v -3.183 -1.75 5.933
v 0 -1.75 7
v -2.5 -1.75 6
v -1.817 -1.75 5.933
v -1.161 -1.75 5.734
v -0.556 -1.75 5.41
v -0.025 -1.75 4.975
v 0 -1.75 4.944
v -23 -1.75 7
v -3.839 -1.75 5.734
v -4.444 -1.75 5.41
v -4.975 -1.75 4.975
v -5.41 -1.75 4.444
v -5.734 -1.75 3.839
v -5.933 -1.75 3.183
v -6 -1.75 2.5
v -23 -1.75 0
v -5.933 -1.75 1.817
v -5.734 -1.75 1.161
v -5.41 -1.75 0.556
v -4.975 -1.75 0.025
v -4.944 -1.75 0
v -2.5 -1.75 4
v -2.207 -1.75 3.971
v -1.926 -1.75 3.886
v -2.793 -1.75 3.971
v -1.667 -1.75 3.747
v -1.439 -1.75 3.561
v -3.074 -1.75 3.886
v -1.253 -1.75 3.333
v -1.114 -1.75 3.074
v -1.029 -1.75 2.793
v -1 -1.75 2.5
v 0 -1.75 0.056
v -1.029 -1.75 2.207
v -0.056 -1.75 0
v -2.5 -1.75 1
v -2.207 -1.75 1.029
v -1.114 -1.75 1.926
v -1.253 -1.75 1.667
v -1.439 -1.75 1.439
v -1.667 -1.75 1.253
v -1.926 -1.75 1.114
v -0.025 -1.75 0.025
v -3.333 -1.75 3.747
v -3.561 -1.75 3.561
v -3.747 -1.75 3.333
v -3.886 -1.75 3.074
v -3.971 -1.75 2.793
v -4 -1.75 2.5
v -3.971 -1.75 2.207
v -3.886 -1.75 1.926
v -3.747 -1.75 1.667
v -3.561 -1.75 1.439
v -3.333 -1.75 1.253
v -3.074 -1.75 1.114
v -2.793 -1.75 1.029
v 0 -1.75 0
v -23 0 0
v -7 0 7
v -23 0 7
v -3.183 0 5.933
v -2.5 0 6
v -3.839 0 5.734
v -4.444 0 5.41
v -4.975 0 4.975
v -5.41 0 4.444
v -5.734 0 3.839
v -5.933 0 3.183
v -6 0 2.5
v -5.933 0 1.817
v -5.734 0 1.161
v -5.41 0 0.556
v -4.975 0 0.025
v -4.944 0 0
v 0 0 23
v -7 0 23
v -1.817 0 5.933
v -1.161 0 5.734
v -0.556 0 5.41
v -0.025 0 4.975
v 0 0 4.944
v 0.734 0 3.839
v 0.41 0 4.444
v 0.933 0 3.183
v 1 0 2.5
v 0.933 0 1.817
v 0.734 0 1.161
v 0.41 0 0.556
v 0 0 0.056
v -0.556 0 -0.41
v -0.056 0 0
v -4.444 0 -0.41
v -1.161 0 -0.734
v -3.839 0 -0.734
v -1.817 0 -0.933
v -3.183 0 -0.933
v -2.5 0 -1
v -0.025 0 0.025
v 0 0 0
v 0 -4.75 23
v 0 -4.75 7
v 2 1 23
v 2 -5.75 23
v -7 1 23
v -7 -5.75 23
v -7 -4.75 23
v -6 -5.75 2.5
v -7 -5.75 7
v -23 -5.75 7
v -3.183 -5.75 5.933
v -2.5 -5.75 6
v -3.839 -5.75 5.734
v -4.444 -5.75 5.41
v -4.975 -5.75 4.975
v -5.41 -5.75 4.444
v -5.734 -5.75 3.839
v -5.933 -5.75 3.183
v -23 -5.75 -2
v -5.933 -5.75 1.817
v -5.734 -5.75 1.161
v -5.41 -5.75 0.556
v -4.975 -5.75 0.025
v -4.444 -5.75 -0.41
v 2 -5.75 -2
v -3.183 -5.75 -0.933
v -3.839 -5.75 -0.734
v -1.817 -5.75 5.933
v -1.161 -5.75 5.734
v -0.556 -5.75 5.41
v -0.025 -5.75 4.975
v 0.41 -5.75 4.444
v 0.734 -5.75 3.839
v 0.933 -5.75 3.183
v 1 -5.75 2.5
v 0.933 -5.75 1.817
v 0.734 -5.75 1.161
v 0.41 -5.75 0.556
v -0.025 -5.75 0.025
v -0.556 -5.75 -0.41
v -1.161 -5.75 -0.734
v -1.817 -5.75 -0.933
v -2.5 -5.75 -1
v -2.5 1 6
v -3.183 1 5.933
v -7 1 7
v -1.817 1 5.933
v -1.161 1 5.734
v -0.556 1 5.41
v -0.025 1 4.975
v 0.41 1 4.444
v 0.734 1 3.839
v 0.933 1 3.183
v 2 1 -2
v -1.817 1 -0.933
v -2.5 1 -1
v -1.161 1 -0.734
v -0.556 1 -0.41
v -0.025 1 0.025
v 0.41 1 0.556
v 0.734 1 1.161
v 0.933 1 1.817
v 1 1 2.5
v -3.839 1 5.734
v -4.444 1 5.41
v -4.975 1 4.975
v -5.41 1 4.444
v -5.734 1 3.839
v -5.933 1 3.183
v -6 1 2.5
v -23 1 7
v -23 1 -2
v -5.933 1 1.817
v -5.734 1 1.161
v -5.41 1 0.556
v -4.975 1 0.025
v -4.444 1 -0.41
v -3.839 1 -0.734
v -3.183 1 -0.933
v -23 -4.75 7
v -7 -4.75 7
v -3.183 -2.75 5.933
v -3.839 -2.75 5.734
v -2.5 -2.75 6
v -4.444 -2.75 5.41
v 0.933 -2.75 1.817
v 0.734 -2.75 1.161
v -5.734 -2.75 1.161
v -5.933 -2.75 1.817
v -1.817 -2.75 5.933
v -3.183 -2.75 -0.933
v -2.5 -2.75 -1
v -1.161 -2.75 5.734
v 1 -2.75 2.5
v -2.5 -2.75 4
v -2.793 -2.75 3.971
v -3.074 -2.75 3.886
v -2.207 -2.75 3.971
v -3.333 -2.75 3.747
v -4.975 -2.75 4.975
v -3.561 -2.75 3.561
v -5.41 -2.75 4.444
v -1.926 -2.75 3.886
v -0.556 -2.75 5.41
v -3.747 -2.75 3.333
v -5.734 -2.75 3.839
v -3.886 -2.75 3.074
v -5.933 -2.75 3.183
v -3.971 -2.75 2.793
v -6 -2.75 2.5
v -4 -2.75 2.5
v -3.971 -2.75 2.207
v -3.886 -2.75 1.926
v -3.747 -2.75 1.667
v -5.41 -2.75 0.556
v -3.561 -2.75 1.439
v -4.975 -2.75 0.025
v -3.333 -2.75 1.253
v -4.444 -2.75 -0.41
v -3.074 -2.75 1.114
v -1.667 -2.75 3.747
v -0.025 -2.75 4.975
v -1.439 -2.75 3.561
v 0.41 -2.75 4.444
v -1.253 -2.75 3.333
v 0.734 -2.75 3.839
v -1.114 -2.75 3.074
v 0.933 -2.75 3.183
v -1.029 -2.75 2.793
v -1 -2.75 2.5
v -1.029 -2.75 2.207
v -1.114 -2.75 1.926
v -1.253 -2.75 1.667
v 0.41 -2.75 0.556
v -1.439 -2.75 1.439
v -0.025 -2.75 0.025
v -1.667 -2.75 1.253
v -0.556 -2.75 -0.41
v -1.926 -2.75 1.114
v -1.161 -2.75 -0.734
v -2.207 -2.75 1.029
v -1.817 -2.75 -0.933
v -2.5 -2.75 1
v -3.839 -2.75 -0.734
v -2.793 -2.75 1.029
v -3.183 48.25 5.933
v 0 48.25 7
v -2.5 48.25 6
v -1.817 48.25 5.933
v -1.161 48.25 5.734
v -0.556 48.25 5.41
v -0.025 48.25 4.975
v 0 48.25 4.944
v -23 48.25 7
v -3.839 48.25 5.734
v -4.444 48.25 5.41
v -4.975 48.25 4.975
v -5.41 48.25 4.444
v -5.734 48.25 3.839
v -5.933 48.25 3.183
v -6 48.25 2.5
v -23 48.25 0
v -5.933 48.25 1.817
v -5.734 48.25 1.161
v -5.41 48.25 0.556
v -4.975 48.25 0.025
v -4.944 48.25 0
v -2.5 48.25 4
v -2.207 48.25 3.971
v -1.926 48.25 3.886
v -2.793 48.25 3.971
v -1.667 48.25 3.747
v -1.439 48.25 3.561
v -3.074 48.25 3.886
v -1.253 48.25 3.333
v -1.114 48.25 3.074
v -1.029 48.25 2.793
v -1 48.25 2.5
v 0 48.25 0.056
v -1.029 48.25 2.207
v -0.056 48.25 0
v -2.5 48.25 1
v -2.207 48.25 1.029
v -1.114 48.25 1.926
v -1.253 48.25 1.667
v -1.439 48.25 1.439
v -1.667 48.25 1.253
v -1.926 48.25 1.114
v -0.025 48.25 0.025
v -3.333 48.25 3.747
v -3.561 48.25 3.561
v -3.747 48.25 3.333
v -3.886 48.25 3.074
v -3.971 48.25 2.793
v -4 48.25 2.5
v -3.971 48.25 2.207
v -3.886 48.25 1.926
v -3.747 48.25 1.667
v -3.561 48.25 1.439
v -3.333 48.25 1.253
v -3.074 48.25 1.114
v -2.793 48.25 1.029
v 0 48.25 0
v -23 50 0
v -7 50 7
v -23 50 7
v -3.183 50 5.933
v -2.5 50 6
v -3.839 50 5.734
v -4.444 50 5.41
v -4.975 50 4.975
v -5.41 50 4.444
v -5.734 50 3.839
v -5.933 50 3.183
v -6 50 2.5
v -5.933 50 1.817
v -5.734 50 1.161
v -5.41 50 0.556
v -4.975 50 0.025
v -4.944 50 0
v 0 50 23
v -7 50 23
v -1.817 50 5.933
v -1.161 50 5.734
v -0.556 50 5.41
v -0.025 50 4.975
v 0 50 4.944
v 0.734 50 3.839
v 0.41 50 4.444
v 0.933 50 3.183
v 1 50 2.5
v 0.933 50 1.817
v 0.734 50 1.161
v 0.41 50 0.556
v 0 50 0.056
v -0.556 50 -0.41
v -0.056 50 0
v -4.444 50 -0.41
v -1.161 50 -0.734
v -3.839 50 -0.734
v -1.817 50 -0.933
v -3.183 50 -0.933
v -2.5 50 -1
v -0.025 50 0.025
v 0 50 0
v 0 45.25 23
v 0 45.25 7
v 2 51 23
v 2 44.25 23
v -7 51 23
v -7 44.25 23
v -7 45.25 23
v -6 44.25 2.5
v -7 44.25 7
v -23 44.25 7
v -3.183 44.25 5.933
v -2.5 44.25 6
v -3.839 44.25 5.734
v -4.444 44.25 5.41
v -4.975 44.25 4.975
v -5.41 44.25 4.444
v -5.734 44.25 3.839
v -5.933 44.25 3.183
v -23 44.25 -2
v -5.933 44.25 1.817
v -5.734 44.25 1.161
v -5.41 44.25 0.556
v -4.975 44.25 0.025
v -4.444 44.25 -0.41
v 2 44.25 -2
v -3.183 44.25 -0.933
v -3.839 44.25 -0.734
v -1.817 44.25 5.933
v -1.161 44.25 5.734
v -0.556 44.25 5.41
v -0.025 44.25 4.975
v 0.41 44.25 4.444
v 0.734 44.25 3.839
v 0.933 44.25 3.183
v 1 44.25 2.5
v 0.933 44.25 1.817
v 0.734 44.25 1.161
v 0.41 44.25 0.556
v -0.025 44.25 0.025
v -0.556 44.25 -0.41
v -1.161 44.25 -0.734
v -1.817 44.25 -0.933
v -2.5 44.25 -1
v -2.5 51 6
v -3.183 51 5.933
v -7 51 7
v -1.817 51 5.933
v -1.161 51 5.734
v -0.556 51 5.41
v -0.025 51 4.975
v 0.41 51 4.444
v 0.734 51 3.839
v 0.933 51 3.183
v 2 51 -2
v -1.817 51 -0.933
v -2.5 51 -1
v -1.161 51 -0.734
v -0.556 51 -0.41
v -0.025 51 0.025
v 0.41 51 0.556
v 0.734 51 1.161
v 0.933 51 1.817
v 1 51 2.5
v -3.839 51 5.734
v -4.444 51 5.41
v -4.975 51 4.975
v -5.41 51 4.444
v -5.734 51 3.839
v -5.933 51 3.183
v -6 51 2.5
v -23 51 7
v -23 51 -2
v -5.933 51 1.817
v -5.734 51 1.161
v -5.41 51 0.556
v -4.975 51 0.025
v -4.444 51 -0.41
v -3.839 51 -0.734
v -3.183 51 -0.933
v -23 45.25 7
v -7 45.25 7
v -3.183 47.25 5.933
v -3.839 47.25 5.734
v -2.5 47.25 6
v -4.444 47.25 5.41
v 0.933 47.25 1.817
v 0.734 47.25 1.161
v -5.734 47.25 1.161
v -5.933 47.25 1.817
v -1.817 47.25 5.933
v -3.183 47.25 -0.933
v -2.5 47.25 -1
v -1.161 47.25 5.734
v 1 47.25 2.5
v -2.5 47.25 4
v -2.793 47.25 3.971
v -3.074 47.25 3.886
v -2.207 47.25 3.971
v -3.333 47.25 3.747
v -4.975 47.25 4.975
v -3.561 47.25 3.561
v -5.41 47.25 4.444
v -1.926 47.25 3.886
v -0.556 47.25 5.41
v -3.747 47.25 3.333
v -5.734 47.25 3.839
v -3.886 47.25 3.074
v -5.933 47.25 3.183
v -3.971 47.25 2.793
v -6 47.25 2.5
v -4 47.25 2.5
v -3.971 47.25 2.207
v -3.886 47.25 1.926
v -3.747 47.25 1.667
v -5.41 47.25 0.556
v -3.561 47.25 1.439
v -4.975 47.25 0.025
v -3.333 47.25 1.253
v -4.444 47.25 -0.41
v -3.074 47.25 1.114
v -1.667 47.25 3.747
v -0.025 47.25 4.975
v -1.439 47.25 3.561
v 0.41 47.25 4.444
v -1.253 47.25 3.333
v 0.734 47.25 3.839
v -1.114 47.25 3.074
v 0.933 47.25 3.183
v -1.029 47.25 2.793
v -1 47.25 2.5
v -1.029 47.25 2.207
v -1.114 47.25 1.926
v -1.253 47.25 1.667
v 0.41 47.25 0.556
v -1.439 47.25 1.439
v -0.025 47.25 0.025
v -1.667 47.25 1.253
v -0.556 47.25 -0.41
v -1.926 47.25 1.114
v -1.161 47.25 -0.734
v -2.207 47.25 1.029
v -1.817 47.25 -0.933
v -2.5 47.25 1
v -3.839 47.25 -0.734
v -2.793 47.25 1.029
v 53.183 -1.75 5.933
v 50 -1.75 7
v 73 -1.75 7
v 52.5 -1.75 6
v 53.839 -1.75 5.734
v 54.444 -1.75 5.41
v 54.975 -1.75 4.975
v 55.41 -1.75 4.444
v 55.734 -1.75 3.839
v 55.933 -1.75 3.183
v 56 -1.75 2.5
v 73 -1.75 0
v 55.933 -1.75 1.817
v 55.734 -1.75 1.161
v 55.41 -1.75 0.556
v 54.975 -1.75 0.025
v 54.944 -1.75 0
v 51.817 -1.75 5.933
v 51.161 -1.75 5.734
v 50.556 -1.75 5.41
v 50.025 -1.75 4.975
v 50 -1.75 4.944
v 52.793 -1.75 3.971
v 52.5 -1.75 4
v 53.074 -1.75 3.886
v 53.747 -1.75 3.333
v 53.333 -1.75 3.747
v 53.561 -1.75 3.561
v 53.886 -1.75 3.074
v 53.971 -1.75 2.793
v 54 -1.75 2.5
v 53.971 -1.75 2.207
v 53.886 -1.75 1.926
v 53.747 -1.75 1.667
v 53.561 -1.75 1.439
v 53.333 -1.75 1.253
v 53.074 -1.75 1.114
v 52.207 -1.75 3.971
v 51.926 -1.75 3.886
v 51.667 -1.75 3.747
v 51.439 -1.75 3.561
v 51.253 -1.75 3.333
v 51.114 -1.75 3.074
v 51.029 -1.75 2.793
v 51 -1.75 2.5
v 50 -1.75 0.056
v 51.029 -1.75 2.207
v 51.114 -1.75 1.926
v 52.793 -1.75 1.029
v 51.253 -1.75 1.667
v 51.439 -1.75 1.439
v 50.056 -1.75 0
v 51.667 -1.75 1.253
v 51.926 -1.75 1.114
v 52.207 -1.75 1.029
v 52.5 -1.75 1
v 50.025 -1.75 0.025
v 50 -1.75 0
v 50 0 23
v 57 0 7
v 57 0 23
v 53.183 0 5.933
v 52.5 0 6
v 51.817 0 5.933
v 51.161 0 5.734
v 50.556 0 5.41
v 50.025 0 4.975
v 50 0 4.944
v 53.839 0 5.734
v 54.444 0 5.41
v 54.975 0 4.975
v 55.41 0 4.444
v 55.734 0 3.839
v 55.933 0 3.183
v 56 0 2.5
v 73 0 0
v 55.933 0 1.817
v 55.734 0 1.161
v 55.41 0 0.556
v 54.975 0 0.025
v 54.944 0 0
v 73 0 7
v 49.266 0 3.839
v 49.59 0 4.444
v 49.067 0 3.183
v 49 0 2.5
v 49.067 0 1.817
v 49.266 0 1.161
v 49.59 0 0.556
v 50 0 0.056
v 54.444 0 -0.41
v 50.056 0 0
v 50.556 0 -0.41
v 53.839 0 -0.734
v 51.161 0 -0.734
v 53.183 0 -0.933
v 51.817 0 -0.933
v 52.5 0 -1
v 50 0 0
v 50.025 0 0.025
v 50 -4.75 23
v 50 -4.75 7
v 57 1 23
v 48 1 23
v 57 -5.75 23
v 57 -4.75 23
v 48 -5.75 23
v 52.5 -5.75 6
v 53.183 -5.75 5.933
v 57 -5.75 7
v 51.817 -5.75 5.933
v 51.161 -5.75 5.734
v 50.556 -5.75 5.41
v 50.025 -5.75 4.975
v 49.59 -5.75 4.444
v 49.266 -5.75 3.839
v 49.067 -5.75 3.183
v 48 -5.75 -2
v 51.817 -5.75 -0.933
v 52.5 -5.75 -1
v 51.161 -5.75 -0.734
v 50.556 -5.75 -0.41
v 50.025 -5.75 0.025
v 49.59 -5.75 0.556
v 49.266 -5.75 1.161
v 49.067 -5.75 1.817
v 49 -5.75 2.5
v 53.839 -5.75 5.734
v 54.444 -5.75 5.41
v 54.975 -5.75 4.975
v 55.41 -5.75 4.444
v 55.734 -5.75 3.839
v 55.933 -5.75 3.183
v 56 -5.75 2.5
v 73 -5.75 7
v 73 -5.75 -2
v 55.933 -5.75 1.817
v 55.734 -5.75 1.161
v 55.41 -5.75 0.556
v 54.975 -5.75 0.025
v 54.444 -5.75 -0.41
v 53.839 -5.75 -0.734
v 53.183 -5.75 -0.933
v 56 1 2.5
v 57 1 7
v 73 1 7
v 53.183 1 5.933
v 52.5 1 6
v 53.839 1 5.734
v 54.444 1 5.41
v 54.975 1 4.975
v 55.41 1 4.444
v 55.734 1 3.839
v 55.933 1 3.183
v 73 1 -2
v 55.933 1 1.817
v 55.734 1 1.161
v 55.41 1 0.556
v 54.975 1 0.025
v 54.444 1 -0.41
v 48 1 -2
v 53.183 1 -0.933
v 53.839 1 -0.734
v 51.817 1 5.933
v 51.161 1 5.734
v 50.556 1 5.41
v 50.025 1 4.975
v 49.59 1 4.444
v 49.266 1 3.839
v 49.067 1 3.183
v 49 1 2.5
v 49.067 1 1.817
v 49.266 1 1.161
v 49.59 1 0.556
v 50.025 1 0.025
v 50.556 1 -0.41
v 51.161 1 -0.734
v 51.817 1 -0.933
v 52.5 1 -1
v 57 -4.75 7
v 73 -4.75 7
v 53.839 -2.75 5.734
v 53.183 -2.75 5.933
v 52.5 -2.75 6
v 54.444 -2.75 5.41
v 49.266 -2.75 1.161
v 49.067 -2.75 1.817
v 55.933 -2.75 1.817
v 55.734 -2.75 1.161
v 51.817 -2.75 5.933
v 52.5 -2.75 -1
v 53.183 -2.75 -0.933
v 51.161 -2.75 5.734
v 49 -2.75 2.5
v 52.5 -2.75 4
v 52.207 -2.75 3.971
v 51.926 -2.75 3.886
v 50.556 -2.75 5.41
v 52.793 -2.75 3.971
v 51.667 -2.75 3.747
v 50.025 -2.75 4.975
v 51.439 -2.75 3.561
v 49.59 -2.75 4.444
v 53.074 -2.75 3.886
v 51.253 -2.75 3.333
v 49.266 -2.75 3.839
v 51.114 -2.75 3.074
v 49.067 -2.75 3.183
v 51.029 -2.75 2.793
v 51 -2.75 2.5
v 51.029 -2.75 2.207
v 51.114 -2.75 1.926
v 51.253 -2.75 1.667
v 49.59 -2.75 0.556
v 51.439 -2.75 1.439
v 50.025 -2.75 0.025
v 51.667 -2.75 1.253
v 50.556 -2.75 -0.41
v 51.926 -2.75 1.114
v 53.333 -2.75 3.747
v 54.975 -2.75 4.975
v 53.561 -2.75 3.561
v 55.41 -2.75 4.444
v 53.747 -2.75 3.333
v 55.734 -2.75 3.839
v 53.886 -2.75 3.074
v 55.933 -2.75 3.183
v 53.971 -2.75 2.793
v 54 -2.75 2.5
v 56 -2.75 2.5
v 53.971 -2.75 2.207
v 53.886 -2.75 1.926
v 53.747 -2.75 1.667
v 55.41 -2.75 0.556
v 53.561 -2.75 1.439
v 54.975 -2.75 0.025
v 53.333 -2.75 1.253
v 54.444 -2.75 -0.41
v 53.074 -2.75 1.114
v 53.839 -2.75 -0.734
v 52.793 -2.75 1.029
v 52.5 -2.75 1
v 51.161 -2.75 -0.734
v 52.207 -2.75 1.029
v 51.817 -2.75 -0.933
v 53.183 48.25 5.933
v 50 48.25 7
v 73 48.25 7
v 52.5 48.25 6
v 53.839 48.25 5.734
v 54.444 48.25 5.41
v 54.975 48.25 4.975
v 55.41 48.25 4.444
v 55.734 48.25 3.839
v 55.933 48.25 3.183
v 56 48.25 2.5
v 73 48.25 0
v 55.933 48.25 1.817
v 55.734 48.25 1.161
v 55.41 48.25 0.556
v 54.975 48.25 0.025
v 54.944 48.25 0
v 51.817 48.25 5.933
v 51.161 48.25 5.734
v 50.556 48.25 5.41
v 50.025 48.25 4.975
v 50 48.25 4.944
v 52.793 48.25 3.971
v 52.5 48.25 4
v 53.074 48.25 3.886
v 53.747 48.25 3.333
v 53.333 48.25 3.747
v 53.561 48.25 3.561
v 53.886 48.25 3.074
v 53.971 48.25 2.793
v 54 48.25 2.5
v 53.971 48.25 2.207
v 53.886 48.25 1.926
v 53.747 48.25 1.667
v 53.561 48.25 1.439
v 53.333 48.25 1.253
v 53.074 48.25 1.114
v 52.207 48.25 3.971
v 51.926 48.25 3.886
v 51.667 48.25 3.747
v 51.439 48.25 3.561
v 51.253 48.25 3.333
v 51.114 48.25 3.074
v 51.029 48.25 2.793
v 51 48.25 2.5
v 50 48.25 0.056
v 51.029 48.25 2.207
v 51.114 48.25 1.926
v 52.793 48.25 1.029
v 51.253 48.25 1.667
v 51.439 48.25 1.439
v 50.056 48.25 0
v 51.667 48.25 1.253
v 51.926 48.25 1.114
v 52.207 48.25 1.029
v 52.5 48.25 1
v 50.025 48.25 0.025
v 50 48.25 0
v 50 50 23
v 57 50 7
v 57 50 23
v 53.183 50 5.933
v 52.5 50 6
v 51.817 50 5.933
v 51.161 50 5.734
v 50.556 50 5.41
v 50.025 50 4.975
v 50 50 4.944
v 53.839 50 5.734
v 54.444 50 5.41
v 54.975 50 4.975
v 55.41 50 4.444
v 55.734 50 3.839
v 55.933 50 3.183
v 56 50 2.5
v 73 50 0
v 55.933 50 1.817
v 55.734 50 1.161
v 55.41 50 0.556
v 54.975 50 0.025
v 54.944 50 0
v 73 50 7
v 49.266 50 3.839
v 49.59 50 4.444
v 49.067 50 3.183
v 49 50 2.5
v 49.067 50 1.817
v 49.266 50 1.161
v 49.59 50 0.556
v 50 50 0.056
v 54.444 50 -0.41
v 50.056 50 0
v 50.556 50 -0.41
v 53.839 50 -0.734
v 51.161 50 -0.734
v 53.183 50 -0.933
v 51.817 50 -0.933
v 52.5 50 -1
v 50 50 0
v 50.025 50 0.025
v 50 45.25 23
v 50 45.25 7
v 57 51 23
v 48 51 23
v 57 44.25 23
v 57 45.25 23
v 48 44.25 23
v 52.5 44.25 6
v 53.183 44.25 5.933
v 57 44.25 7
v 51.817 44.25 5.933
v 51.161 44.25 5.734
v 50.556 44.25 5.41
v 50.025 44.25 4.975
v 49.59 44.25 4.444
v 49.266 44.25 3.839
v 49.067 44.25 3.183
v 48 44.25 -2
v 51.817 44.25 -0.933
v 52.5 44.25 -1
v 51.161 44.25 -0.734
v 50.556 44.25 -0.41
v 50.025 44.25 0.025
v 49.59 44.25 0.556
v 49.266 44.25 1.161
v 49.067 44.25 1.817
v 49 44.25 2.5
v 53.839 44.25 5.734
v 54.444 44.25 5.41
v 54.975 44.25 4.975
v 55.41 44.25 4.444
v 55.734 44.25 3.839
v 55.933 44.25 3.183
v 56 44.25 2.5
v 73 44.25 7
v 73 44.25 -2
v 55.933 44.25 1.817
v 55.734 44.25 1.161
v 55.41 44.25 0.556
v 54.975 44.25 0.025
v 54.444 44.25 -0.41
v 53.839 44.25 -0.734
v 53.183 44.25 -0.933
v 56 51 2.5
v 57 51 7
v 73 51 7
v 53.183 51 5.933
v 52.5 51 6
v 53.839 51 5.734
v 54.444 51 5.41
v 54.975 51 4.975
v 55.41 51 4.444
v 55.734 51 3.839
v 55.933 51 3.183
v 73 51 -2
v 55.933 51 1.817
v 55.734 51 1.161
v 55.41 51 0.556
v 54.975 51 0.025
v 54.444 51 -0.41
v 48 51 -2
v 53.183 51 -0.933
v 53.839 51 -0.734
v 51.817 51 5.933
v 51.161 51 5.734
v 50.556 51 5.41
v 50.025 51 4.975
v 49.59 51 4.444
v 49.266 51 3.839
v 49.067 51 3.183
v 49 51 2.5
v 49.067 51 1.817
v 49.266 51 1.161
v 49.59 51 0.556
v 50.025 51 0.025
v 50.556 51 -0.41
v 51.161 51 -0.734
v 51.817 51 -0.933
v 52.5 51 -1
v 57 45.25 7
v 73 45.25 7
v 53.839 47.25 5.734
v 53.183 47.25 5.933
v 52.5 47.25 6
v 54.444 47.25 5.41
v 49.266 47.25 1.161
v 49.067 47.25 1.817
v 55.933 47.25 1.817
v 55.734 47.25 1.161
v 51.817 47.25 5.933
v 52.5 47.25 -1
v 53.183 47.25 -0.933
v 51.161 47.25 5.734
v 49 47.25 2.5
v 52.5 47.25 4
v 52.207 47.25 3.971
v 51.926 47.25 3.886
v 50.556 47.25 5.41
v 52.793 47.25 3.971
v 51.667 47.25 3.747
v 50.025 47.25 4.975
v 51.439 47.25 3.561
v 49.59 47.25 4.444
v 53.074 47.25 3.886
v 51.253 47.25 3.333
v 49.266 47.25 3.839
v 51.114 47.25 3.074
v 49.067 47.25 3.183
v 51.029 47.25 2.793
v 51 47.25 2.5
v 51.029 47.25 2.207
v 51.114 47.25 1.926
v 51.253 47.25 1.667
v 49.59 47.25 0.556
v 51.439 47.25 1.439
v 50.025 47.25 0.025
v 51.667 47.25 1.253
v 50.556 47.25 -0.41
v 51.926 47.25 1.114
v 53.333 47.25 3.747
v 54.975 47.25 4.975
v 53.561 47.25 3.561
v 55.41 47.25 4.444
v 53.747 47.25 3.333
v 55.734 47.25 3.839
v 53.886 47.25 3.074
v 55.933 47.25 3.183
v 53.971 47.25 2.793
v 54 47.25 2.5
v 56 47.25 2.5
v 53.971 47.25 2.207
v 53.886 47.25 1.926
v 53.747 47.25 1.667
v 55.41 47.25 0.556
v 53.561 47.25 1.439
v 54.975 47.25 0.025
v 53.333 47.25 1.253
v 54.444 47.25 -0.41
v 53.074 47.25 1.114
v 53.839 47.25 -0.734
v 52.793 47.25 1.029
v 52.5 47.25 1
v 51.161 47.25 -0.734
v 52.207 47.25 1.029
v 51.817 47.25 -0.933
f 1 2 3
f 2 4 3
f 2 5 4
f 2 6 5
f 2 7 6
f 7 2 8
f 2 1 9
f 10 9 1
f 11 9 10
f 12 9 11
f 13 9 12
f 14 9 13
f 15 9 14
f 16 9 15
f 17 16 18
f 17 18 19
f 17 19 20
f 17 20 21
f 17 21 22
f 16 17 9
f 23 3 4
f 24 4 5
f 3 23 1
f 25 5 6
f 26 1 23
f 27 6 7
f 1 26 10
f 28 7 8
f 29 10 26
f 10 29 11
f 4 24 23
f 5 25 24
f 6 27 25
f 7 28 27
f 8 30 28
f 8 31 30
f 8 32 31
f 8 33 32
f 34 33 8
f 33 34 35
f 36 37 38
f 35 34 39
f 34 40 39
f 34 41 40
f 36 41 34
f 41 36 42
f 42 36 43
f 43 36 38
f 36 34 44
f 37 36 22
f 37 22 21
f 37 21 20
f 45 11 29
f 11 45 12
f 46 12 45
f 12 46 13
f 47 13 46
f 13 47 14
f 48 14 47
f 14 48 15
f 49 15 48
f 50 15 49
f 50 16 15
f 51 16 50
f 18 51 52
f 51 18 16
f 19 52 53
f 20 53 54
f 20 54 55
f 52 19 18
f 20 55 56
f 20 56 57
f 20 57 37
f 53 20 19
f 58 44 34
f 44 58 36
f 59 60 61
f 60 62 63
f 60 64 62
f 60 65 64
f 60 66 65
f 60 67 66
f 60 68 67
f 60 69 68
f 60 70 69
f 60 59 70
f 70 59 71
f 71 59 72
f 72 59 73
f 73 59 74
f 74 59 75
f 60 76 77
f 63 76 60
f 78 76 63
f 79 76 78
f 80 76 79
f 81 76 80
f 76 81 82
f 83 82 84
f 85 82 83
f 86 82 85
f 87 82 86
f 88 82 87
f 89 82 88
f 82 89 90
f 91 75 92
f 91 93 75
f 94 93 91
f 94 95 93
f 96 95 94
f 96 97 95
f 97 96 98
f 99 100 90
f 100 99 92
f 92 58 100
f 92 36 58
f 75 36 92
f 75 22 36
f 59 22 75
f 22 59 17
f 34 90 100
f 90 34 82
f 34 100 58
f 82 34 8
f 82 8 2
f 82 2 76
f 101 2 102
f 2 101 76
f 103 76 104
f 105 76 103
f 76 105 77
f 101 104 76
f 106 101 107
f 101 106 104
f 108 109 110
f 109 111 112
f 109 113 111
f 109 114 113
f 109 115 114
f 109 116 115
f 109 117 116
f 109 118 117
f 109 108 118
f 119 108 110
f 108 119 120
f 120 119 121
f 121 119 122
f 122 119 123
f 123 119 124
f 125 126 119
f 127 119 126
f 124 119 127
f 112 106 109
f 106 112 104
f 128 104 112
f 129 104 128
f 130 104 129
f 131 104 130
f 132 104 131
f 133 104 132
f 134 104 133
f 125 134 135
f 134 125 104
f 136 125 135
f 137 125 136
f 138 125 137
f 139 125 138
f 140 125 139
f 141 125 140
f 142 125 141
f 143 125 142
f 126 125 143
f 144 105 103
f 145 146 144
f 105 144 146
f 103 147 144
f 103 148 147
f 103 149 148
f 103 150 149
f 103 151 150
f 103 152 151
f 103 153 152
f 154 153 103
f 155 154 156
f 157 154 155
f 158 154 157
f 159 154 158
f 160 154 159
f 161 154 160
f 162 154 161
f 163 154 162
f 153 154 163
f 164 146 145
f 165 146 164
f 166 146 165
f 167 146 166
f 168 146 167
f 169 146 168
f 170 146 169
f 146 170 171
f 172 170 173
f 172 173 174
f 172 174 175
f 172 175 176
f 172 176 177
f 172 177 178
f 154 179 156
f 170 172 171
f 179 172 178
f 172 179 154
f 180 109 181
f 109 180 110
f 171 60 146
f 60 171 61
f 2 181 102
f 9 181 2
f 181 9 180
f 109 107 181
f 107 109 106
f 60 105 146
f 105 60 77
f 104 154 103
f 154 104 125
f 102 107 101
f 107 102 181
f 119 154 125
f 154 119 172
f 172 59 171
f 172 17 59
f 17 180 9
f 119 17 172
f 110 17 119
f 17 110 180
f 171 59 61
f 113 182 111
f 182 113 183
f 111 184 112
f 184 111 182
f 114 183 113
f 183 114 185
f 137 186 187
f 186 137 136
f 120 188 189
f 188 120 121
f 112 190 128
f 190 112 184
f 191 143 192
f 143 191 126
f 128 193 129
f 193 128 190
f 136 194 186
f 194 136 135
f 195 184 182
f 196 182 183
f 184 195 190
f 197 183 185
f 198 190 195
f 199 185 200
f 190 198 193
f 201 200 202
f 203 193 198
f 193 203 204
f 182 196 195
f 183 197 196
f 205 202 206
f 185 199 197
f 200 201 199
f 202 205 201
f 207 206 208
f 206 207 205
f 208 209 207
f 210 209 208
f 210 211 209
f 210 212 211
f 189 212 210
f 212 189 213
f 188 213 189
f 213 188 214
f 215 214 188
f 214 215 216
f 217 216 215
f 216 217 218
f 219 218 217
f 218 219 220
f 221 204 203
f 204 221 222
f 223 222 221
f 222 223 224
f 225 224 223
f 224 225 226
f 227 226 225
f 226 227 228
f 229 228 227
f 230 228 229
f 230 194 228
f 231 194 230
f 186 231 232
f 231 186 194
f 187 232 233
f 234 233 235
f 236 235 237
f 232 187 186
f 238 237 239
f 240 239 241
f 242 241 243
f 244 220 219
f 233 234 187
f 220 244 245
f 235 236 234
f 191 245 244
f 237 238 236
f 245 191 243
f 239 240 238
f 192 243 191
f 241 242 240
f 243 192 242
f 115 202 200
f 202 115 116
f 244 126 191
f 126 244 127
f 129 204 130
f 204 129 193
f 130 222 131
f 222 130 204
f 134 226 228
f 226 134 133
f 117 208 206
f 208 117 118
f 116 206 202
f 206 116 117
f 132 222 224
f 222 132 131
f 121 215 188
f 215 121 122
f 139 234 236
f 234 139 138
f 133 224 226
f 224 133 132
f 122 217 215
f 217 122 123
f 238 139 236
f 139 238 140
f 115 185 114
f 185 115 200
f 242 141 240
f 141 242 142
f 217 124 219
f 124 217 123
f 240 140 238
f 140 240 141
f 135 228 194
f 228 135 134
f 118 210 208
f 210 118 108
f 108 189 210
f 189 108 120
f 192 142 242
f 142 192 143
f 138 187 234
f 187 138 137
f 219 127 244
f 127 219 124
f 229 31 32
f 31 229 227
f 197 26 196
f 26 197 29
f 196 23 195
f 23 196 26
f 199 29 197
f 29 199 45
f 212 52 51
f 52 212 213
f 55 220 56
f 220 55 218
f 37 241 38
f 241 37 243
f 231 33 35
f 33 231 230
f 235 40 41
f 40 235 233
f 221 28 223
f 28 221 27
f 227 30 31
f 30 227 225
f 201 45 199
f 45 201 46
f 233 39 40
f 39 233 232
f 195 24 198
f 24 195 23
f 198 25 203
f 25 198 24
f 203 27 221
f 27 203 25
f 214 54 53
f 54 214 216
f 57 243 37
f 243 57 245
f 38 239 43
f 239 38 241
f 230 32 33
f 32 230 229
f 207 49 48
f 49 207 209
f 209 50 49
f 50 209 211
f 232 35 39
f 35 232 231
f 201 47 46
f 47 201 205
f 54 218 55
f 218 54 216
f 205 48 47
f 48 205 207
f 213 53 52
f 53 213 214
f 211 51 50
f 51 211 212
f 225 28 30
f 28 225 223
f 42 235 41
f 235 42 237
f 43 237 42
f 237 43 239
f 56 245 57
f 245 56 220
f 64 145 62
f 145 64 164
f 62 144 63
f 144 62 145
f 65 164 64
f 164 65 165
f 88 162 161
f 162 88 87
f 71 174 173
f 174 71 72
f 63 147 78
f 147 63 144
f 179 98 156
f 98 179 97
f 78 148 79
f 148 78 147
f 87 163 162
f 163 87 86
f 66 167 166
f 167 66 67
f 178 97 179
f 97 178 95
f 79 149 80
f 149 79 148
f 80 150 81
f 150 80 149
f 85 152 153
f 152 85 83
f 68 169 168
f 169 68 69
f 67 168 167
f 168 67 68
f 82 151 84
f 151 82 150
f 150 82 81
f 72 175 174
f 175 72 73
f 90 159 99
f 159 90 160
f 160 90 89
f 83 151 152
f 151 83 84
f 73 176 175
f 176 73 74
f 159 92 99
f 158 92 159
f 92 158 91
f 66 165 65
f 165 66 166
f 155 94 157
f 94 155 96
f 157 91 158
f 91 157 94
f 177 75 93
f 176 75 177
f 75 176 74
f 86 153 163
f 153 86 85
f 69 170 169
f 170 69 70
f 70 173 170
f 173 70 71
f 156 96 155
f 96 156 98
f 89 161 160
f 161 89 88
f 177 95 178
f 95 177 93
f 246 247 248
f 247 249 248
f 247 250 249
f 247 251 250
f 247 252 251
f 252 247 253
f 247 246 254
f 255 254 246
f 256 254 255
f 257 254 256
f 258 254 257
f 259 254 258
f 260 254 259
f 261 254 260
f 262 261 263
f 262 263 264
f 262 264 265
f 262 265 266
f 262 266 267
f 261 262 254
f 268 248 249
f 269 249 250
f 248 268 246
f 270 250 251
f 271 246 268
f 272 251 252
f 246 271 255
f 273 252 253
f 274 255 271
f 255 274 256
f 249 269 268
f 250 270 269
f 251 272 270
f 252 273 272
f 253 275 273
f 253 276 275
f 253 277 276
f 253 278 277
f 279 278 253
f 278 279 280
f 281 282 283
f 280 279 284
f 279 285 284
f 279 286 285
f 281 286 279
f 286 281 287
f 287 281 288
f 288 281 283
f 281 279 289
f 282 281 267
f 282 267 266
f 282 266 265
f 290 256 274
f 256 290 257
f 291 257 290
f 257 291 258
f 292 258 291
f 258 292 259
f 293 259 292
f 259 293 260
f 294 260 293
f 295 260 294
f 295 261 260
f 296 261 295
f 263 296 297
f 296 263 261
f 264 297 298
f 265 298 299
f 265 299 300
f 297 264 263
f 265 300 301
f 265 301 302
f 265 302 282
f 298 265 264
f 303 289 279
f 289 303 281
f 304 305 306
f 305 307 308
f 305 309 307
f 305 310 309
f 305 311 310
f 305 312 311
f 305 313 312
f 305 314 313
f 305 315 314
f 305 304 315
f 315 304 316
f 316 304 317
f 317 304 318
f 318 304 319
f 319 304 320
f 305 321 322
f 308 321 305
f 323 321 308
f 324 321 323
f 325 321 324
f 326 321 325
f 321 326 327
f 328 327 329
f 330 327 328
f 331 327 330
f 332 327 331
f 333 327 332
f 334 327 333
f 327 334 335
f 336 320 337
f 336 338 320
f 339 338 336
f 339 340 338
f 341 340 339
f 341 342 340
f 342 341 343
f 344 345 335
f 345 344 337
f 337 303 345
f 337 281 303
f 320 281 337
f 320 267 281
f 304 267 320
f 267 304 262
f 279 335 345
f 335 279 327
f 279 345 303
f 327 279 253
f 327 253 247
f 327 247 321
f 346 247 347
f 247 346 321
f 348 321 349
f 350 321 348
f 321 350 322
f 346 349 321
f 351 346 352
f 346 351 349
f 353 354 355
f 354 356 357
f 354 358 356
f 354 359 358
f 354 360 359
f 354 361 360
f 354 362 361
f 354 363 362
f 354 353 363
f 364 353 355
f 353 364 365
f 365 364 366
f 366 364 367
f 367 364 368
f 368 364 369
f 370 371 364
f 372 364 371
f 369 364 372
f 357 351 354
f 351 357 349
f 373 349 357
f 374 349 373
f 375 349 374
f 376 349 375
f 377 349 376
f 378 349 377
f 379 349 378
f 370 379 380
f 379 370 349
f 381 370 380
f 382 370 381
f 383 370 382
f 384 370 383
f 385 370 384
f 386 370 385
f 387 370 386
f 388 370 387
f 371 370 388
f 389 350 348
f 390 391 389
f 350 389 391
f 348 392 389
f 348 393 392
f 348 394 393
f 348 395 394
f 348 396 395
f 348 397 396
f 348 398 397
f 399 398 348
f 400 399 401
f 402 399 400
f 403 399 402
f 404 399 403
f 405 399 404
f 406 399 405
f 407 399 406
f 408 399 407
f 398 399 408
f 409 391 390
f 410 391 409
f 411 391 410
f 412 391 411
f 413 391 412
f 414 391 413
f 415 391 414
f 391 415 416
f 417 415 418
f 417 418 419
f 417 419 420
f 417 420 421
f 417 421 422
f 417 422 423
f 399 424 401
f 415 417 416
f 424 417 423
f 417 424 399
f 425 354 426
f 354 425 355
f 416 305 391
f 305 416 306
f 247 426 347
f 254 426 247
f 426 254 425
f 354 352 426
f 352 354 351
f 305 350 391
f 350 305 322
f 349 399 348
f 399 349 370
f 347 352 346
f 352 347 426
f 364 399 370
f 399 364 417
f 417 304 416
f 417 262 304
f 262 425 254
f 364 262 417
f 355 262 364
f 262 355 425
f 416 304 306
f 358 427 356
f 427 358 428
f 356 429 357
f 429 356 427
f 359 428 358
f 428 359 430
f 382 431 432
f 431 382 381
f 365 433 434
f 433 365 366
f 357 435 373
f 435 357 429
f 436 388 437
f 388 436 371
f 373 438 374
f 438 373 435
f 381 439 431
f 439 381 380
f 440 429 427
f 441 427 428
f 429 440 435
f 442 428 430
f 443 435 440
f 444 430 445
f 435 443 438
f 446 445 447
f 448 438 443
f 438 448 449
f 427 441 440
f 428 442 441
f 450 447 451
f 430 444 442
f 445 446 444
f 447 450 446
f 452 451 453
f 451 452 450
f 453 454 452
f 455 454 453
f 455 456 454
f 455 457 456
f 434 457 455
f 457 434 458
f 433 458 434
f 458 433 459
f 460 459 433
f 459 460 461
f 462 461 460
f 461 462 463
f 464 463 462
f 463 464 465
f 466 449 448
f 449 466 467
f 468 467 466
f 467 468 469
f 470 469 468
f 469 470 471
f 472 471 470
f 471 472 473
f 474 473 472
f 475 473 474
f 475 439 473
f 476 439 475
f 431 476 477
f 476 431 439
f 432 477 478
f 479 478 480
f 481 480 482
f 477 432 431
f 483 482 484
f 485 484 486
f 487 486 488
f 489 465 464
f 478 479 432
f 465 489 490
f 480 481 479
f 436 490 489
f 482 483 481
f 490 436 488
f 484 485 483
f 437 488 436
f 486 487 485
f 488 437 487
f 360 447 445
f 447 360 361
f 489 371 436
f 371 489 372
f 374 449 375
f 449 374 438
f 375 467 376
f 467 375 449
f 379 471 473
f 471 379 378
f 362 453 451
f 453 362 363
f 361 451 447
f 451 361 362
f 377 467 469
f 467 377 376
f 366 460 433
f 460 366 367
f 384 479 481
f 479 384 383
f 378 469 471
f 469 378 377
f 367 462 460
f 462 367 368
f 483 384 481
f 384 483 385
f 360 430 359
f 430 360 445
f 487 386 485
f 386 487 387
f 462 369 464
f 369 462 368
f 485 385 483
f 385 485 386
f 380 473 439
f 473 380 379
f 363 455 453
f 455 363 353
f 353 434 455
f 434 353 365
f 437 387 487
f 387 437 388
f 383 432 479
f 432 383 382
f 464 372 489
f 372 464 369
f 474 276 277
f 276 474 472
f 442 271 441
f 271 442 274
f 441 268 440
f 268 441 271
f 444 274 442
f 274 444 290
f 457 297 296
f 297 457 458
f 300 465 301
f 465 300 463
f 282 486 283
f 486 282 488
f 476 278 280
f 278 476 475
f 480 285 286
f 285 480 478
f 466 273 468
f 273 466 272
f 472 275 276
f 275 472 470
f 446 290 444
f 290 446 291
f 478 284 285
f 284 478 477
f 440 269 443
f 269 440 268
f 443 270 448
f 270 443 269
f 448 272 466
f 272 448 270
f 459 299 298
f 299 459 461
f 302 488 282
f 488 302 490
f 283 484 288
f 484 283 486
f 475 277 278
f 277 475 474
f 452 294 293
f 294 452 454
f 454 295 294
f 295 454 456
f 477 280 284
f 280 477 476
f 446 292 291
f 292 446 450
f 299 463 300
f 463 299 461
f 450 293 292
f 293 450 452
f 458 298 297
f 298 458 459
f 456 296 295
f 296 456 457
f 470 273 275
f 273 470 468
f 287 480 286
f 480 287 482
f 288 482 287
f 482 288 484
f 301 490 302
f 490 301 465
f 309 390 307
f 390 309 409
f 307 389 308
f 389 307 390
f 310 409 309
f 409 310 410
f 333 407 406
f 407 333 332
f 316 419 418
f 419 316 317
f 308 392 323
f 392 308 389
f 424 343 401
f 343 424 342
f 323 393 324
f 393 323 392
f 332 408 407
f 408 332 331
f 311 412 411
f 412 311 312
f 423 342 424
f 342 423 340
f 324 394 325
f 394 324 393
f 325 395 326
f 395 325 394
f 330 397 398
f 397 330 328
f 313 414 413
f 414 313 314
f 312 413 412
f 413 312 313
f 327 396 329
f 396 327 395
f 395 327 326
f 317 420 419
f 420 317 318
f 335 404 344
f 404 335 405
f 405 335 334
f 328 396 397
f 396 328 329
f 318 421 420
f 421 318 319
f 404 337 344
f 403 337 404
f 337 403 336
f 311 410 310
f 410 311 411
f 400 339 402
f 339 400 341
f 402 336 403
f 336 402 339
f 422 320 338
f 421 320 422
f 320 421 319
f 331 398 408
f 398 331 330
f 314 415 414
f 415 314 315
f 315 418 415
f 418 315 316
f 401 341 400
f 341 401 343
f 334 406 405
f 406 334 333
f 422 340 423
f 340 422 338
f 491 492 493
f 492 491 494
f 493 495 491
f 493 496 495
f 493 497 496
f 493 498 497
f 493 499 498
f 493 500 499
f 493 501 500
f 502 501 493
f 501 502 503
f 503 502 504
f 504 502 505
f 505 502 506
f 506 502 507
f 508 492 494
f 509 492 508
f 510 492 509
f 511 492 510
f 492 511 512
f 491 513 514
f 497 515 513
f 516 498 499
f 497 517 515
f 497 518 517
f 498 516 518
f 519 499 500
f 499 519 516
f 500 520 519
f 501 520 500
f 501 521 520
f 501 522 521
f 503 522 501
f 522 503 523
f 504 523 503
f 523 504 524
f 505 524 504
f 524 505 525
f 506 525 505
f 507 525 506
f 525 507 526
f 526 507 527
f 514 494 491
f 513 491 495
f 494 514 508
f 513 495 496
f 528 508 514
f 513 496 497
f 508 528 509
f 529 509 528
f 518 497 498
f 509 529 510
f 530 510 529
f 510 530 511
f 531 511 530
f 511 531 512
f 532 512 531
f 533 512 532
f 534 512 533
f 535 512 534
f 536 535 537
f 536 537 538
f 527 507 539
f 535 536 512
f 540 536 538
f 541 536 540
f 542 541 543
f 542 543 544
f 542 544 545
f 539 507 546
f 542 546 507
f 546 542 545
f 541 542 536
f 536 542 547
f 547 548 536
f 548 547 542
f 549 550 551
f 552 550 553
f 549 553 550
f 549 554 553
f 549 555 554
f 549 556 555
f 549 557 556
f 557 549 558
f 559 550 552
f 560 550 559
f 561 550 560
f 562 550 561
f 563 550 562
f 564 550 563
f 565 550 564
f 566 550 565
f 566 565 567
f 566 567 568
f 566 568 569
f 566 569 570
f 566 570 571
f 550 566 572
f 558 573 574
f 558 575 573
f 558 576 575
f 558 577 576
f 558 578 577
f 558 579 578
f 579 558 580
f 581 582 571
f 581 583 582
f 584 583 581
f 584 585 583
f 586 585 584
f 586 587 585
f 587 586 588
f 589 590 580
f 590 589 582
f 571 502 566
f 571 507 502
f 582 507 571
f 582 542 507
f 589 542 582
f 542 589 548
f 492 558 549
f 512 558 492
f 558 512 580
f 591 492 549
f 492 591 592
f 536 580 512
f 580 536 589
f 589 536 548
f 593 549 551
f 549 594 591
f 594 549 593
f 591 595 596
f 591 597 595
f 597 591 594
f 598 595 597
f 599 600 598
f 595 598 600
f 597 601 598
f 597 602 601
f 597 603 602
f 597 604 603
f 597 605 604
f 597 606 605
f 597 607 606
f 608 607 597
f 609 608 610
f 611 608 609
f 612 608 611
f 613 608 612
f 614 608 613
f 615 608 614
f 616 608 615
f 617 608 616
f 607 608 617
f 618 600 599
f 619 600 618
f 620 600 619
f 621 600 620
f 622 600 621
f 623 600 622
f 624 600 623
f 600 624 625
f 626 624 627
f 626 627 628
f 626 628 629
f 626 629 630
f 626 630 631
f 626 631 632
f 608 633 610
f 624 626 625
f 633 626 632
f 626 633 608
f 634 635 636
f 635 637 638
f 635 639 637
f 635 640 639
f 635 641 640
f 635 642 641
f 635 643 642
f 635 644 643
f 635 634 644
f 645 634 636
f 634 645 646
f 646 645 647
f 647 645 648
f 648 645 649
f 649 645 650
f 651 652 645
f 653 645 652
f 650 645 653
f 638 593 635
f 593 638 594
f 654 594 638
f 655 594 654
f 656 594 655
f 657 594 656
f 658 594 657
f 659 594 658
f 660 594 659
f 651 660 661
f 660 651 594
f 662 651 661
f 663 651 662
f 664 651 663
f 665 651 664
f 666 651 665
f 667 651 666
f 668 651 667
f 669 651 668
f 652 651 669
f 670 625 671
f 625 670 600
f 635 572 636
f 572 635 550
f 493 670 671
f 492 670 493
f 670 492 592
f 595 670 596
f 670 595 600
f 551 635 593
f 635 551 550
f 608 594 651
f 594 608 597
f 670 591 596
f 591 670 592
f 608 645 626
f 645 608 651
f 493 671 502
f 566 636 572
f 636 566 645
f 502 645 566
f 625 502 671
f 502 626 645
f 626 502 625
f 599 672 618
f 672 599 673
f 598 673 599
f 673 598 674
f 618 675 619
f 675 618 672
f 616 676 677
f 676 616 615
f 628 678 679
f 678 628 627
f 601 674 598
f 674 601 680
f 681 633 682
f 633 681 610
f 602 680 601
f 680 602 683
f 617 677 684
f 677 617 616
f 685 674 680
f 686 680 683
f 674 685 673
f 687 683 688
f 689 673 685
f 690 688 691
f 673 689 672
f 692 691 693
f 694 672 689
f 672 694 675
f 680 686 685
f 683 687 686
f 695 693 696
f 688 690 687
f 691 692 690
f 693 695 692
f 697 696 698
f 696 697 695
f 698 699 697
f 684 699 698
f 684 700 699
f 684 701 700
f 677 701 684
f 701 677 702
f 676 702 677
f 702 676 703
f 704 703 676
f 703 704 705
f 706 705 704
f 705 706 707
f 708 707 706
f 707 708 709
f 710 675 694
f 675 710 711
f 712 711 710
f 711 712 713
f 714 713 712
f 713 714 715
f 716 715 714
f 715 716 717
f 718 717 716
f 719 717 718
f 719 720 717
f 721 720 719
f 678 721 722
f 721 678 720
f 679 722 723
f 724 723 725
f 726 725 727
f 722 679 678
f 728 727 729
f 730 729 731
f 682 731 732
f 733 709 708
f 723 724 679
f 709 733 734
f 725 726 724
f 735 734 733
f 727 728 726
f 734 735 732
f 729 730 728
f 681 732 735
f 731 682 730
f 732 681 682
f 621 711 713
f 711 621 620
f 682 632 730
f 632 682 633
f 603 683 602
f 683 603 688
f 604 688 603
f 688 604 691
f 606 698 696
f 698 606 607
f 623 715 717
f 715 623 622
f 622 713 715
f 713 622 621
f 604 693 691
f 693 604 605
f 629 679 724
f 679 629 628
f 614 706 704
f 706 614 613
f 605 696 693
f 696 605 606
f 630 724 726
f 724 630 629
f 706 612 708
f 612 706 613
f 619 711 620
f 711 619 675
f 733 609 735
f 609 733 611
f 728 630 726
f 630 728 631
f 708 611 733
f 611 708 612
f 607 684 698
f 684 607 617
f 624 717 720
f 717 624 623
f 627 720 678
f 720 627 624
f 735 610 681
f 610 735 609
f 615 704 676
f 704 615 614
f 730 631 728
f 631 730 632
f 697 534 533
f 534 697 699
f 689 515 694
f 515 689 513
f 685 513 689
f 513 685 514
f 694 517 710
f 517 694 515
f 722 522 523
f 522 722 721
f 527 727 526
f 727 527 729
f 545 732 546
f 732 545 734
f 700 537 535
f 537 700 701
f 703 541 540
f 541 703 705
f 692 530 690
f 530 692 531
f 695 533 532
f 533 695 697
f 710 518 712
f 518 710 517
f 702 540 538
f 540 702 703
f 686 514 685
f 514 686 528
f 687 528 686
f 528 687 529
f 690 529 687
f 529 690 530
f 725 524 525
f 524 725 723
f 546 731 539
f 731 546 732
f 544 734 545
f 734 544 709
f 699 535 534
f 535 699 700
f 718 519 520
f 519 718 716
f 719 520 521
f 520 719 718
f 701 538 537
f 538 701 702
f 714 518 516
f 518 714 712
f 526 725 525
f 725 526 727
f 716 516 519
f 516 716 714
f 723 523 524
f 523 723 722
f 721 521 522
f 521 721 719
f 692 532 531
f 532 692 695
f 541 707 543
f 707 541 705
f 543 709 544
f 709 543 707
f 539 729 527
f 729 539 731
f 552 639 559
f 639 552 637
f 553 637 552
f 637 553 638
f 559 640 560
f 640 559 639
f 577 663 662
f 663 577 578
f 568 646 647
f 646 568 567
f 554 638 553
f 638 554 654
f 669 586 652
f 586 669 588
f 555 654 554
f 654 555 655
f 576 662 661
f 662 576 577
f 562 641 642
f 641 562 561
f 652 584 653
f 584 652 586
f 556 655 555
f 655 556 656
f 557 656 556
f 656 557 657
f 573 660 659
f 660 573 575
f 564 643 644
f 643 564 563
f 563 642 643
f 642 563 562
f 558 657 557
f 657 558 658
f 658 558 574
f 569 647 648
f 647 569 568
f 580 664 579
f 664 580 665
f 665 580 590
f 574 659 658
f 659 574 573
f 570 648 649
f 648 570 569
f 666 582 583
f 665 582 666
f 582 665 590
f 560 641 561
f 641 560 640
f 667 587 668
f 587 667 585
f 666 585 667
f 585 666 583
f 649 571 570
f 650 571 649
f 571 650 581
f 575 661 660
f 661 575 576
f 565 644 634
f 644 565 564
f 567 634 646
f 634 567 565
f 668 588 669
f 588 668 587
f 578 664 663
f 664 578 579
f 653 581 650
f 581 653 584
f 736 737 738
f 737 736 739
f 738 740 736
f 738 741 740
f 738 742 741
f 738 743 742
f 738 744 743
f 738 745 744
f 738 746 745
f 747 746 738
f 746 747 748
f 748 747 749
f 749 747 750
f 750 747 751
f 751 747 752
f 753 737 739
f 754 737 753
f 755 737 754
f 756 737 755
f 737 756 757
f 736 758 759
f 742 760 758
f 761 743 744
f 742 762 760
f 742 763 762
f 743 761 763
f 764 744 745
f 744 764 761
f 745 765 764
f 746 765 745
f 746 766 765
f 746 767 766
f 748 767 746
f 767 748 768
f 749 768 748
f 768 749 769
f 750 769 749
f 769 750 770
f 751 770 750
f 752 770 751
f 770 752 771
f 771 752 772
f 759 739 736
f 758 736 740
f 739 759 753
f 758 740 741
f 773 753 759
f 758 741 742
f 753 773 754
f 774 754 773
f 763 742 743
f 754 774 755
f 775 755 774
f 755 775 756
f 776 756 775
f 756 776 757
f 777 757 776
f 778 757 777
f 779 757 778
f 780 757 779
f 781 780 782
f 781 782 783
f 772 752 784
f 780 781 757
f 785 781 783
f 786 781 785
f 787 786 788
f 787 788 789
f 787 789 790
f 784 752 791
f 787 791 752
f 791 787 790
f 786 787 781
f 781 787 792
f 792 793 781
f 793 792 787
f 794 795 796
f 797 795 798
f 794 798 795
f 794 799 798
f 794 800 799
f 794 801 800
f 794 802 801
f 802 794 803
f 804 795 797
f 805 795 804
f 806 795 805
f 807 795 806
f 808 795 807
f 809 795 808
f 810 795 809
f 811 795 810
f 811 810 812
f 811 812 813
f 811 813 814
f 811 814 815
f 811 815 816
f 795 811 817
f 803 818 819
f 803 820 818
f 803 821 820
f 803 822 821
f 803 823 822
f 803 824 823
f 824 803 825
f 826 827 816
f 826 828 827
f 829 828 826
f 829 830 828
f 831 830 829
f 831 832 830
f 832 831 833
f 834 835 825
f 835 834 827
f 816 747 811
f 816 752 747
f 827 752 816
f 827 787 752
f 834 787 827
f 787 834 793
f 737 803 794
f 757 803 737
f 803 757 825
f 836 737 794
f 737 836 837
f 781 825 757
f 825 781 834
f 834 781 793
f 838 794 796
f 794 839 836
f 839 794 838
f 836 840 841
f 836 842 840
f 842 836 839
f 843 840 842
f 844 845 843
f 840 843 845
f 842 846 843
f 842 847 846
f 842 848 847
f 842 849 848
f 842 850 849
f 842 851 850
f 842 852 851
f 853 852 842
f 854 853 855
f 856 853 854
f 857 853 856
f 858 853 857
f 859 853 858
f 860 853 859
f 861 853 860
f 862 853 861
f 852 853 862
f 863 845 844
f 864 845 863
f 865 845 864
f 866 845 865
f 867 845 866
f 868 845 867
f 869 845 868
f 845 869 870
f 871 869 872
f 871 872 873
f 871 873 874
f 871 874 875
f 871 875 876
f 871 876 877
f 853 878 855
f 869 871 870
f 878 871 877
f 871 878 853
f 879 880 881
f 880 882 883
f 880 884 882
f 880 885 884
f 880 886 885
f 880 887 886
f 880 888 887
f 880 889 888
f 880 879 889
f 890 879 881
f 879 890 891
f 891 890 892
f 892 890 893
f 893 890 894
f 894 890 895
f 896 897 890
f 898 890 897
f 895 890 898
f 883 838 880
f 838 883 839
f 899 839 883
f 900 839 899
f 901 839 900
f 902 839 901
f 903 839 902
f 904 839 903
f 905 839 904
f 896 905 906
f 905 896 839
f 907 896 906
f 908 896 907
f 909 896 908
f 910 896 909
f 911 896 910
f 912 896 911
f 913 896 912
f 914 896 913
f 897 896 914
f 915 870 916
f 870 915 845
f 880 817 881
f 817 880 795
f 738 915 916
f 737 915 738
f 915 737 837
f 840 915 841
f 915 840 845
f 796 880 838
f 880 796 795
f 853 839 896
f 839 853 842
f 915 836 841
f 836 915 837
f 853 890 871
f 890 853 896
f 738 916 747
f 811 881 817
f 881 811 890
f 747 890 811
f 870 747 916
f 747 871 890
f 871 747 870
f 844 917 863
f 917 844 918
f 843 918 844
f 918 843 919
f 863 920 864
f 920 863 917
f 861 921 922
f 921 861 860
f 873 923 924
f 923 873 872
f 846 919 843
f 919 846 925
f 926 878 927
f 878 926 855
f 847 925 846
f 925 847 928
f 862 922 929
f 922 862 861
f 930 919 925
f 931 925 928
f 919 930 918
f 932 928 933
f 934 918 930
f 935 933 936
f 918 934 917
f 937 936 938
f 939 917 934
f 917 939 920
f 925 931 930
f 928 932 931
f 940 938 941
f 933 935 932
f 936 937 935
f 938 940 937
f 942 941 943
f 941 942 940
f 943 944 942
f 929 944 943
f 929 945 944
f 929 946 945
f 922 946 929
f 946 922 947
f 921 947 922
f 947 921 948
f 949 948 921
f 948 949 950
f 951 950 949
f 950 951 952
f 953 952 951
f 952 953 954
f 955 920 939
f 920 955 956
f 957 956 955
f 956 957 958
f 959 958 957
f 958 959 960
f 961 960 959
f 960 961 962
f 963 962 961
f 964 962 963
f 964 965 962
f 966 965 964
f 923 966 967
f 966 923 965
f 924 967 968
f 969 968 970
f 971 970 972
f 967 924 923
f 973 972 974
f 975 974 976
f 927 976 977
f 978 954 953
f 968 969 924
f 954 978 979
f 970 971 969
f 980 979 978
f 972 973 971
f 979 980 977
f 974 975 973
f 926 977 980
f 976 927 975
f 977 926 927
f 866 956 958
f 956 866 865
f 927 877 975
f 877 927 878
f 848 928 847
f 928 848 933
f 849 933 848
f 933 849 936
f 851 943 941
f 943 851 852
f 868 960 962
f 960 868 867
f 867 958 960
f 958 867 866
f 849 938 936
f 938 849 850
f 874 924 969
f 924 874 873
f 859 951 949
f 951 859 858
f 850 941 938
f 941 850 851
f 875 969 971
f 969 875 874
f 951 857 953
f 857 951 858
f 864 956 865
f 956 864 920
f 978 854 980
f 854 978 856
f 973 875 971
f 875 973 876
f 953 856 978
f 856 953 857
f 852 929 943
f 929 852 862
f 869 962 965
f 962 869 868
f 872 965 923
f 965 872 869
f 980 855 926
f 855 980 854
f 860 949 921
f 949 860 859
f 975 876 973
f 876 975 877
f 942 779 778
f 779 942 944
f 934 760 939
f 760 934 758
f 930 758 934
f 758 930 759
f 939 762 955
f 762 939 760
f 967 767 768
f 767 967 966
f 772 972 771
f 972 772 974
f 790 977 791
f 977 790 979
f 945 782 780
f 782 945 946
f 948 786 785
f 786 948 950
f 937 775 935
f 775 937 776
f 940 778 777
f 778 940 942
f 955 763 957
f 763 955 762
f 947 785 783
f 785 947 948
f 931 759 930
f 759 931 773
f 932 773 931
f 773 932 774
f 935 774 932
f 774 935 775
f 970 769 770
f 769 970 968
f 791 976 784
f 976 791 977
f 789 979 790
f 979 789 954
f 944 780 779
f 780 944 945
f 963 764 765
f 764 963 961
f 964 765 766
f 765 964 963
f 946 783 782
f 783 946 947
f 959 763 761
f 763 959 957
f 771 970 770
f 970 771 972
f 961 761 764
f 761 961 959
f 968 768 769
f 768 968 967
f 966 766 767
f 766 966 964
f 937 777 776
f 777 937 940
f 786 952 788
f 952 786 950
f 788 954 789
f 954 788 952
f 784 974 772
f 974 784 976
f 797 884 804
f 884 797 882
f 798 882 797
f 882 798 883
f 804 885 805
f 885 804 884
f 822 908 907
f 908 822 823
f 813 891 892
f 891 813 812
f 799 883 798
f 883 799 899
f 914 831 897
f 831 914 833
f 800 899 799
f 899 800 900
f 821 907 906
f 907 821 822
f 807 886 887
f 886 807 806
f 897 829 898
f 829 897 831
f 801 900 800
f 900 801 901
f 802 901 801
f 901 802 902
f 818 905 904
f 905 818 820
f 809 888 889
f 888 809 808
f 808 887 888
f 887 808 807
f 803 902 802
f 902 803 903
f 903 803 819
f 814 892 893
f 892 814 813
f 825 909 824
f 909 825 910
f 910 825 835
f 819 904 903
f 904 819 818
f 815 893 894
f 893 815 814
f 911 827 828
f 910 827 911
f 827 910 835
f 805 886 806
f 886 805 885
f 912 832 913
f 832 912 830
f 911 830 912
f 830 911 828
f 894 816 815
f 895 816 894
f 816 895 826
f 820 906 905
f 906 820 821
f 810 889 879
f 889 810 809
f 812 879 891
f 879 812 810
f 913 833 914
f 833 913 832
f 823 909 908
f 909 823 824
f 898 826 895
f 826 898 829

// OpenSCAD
/**
 * Author: Luis Chardon <luischardon@gmail.com>
 * Description: Prusa i3 Heated Bed Glass Holder
 * Date Modified: 8/13/2016
 */

/* [Heated Bed Properties] */
// Heated Bed PCB Board Thickness
BedThickness = 1.75; // [1:0.01:3]

/* [Glass Bed Properties] */
// Thickness of your glass bed
GlassThickness = 3; // [1:0.1:5]
// Width of your glass bed
GlassWidth = 200; // [180:200]
// Height of your glass bed
GlassHeight = 214; // [200:214]

/* [Clip Properties] */
// Top and bottom clip thickness
ClipThickness = 1; // [0.5:0.1:3]
// How long the clip extends to cover the top of the glass bed
ClipWidth = 7; // [1:15]
// How long the clip extends along the perimeter of the bed
ClipLength = 16; // [5:50]
// Clip outer wall width
ClipOuterWallWidth = 2; // [1:5]

/* [Bed Preview] */
// Preview clips on the bed and glass
ShowPreview = "false"; // [false,true]

/* [Hidden] */
$fn=32;
BedWidthAndHeight = 214;
Hole = 20;
TotalHeight = ClipThickness + BedThickness + GlassThickness + ClipThickness;
SpacerWidth = (BedWidthAndHeight - GlassWidth) / 2; 

module HoleLL()
{
    translate([2.5, 2.5, -Hole / 2]) cylinder(d = 3, h = Hole);
};
module HoleLR()
{
    translate([BedWidthAndHeight - 2.5, 2.5, -Hole / 2]) cylinder(d = 3, h = Hole);
};
module HoleTL()
{
    translate([2.5, BedWidthAndHeight - 2.5, -Hole / 2]) cylinder(d = 3, h = Hole);
};
module HoleTR()
{
    translate([BedWidthAndHeight - 2.5, BedWidthAndHeight - 2.5, -Hole / 2]) cylinder (d = 3, h = Hole);
};

module HeatedBed()
{
    difference(){
        color("red") cube([BedWidthAndHeight, BedWidthAndHeight, BedThickness]);
        HoleLL();
        HoleLR();
        HoleTL();
        HoleTR();
    }
}

module Glass()
{
    translate([SpacerWidth, (BedWidthAndHeight - GlassHeight) / 2, BedThickness]) color([1, 1, 1, 0.5]) cube([GlassWidth, GlassHeight, GlassThickness]);
}

module Holder()
{
    color("blue")
    {
        // Right clip
        difference()
        {
            translate([SpacerWidth, -ClipOuterWallWidth, -ClipThickness]) cube([ClipLength, ClipOuterWallWidth + ClipWidth, TotalHeight]);
            HeatedBed();
            Glass();
        }

        // Top Clip
        difference()
        {
            translate([-ClipOuterWallWidth, SpacerWidth, -ClipThickness]) cube([ClipOuterWallWidth + SpacerWidth, ClipLength, TotalHeight]);
            HeatedBed();
            Glass();
        }

        // Screw Spacer
        difference()
        {
            translate([2.5, 2.5, BedThickness]) cylinder(d = 7, h = 1);
            HoleLL();
        }
        
        // Screw Hole
        difference()
        {
            translate([-ClipOuterWallWidth, -ClipOuterWallWidth, -ClipThickness]) cube([SpacerWidth + ClipOuterWallWidth, SpacerWidth + ClipOuterWallWidth, TotalHeight]);
            // Screw body hole
            HoleLL();
            // Screw head hole
            translate([2.5, 2.5, BedThickness]) cylinder(d = 7, h = GlassThickness + ClipThickness + 0.1);
            // Spring bottom hole
            translate([2.5, 2.5, -ClipThickness - 0.1]) cylinder(d = 7, h = ClipThickness + 0.1);
            HeatedBed();
            Glass();
        }
        
    }
}

module Preview()
{
    Holder();
    translate([BedWidthAndHeight, BedWidthAndHeight, 0]) rotate(a=[0, 0, 180]) Holder();
    translate([BedWidthAndHeight, 0, 0]) mirror([1,0,0]) Holder();
    translate([0, BedWidthAndHeight, 0]) mirror([1,0,0]) rotate(a=[0, 0, 180]) Holder();
    HeatedBed();
    Glass();
}

module Print()
{
    spacex = 50;
    spacey = 50;
    rotation = 270;
    rotate(a=[0, rotation, 90]) Holder();
    translate([0, spacey, 0]) rotate(a=[0, rotation, 90]) Holder();
    translate([spacex, 0, 0]) mirror([1, 0, 0]) rotate(a=[0, rotation, 90]) Holder();
    translate([spacex, spacey, 0]) mirror([1, 0, 0]) rotate(a=[0, rotation, 90]) Holder();
}

if(ShowPreview == "true")
{
    Preview();
}
else
{
    Print();
}
